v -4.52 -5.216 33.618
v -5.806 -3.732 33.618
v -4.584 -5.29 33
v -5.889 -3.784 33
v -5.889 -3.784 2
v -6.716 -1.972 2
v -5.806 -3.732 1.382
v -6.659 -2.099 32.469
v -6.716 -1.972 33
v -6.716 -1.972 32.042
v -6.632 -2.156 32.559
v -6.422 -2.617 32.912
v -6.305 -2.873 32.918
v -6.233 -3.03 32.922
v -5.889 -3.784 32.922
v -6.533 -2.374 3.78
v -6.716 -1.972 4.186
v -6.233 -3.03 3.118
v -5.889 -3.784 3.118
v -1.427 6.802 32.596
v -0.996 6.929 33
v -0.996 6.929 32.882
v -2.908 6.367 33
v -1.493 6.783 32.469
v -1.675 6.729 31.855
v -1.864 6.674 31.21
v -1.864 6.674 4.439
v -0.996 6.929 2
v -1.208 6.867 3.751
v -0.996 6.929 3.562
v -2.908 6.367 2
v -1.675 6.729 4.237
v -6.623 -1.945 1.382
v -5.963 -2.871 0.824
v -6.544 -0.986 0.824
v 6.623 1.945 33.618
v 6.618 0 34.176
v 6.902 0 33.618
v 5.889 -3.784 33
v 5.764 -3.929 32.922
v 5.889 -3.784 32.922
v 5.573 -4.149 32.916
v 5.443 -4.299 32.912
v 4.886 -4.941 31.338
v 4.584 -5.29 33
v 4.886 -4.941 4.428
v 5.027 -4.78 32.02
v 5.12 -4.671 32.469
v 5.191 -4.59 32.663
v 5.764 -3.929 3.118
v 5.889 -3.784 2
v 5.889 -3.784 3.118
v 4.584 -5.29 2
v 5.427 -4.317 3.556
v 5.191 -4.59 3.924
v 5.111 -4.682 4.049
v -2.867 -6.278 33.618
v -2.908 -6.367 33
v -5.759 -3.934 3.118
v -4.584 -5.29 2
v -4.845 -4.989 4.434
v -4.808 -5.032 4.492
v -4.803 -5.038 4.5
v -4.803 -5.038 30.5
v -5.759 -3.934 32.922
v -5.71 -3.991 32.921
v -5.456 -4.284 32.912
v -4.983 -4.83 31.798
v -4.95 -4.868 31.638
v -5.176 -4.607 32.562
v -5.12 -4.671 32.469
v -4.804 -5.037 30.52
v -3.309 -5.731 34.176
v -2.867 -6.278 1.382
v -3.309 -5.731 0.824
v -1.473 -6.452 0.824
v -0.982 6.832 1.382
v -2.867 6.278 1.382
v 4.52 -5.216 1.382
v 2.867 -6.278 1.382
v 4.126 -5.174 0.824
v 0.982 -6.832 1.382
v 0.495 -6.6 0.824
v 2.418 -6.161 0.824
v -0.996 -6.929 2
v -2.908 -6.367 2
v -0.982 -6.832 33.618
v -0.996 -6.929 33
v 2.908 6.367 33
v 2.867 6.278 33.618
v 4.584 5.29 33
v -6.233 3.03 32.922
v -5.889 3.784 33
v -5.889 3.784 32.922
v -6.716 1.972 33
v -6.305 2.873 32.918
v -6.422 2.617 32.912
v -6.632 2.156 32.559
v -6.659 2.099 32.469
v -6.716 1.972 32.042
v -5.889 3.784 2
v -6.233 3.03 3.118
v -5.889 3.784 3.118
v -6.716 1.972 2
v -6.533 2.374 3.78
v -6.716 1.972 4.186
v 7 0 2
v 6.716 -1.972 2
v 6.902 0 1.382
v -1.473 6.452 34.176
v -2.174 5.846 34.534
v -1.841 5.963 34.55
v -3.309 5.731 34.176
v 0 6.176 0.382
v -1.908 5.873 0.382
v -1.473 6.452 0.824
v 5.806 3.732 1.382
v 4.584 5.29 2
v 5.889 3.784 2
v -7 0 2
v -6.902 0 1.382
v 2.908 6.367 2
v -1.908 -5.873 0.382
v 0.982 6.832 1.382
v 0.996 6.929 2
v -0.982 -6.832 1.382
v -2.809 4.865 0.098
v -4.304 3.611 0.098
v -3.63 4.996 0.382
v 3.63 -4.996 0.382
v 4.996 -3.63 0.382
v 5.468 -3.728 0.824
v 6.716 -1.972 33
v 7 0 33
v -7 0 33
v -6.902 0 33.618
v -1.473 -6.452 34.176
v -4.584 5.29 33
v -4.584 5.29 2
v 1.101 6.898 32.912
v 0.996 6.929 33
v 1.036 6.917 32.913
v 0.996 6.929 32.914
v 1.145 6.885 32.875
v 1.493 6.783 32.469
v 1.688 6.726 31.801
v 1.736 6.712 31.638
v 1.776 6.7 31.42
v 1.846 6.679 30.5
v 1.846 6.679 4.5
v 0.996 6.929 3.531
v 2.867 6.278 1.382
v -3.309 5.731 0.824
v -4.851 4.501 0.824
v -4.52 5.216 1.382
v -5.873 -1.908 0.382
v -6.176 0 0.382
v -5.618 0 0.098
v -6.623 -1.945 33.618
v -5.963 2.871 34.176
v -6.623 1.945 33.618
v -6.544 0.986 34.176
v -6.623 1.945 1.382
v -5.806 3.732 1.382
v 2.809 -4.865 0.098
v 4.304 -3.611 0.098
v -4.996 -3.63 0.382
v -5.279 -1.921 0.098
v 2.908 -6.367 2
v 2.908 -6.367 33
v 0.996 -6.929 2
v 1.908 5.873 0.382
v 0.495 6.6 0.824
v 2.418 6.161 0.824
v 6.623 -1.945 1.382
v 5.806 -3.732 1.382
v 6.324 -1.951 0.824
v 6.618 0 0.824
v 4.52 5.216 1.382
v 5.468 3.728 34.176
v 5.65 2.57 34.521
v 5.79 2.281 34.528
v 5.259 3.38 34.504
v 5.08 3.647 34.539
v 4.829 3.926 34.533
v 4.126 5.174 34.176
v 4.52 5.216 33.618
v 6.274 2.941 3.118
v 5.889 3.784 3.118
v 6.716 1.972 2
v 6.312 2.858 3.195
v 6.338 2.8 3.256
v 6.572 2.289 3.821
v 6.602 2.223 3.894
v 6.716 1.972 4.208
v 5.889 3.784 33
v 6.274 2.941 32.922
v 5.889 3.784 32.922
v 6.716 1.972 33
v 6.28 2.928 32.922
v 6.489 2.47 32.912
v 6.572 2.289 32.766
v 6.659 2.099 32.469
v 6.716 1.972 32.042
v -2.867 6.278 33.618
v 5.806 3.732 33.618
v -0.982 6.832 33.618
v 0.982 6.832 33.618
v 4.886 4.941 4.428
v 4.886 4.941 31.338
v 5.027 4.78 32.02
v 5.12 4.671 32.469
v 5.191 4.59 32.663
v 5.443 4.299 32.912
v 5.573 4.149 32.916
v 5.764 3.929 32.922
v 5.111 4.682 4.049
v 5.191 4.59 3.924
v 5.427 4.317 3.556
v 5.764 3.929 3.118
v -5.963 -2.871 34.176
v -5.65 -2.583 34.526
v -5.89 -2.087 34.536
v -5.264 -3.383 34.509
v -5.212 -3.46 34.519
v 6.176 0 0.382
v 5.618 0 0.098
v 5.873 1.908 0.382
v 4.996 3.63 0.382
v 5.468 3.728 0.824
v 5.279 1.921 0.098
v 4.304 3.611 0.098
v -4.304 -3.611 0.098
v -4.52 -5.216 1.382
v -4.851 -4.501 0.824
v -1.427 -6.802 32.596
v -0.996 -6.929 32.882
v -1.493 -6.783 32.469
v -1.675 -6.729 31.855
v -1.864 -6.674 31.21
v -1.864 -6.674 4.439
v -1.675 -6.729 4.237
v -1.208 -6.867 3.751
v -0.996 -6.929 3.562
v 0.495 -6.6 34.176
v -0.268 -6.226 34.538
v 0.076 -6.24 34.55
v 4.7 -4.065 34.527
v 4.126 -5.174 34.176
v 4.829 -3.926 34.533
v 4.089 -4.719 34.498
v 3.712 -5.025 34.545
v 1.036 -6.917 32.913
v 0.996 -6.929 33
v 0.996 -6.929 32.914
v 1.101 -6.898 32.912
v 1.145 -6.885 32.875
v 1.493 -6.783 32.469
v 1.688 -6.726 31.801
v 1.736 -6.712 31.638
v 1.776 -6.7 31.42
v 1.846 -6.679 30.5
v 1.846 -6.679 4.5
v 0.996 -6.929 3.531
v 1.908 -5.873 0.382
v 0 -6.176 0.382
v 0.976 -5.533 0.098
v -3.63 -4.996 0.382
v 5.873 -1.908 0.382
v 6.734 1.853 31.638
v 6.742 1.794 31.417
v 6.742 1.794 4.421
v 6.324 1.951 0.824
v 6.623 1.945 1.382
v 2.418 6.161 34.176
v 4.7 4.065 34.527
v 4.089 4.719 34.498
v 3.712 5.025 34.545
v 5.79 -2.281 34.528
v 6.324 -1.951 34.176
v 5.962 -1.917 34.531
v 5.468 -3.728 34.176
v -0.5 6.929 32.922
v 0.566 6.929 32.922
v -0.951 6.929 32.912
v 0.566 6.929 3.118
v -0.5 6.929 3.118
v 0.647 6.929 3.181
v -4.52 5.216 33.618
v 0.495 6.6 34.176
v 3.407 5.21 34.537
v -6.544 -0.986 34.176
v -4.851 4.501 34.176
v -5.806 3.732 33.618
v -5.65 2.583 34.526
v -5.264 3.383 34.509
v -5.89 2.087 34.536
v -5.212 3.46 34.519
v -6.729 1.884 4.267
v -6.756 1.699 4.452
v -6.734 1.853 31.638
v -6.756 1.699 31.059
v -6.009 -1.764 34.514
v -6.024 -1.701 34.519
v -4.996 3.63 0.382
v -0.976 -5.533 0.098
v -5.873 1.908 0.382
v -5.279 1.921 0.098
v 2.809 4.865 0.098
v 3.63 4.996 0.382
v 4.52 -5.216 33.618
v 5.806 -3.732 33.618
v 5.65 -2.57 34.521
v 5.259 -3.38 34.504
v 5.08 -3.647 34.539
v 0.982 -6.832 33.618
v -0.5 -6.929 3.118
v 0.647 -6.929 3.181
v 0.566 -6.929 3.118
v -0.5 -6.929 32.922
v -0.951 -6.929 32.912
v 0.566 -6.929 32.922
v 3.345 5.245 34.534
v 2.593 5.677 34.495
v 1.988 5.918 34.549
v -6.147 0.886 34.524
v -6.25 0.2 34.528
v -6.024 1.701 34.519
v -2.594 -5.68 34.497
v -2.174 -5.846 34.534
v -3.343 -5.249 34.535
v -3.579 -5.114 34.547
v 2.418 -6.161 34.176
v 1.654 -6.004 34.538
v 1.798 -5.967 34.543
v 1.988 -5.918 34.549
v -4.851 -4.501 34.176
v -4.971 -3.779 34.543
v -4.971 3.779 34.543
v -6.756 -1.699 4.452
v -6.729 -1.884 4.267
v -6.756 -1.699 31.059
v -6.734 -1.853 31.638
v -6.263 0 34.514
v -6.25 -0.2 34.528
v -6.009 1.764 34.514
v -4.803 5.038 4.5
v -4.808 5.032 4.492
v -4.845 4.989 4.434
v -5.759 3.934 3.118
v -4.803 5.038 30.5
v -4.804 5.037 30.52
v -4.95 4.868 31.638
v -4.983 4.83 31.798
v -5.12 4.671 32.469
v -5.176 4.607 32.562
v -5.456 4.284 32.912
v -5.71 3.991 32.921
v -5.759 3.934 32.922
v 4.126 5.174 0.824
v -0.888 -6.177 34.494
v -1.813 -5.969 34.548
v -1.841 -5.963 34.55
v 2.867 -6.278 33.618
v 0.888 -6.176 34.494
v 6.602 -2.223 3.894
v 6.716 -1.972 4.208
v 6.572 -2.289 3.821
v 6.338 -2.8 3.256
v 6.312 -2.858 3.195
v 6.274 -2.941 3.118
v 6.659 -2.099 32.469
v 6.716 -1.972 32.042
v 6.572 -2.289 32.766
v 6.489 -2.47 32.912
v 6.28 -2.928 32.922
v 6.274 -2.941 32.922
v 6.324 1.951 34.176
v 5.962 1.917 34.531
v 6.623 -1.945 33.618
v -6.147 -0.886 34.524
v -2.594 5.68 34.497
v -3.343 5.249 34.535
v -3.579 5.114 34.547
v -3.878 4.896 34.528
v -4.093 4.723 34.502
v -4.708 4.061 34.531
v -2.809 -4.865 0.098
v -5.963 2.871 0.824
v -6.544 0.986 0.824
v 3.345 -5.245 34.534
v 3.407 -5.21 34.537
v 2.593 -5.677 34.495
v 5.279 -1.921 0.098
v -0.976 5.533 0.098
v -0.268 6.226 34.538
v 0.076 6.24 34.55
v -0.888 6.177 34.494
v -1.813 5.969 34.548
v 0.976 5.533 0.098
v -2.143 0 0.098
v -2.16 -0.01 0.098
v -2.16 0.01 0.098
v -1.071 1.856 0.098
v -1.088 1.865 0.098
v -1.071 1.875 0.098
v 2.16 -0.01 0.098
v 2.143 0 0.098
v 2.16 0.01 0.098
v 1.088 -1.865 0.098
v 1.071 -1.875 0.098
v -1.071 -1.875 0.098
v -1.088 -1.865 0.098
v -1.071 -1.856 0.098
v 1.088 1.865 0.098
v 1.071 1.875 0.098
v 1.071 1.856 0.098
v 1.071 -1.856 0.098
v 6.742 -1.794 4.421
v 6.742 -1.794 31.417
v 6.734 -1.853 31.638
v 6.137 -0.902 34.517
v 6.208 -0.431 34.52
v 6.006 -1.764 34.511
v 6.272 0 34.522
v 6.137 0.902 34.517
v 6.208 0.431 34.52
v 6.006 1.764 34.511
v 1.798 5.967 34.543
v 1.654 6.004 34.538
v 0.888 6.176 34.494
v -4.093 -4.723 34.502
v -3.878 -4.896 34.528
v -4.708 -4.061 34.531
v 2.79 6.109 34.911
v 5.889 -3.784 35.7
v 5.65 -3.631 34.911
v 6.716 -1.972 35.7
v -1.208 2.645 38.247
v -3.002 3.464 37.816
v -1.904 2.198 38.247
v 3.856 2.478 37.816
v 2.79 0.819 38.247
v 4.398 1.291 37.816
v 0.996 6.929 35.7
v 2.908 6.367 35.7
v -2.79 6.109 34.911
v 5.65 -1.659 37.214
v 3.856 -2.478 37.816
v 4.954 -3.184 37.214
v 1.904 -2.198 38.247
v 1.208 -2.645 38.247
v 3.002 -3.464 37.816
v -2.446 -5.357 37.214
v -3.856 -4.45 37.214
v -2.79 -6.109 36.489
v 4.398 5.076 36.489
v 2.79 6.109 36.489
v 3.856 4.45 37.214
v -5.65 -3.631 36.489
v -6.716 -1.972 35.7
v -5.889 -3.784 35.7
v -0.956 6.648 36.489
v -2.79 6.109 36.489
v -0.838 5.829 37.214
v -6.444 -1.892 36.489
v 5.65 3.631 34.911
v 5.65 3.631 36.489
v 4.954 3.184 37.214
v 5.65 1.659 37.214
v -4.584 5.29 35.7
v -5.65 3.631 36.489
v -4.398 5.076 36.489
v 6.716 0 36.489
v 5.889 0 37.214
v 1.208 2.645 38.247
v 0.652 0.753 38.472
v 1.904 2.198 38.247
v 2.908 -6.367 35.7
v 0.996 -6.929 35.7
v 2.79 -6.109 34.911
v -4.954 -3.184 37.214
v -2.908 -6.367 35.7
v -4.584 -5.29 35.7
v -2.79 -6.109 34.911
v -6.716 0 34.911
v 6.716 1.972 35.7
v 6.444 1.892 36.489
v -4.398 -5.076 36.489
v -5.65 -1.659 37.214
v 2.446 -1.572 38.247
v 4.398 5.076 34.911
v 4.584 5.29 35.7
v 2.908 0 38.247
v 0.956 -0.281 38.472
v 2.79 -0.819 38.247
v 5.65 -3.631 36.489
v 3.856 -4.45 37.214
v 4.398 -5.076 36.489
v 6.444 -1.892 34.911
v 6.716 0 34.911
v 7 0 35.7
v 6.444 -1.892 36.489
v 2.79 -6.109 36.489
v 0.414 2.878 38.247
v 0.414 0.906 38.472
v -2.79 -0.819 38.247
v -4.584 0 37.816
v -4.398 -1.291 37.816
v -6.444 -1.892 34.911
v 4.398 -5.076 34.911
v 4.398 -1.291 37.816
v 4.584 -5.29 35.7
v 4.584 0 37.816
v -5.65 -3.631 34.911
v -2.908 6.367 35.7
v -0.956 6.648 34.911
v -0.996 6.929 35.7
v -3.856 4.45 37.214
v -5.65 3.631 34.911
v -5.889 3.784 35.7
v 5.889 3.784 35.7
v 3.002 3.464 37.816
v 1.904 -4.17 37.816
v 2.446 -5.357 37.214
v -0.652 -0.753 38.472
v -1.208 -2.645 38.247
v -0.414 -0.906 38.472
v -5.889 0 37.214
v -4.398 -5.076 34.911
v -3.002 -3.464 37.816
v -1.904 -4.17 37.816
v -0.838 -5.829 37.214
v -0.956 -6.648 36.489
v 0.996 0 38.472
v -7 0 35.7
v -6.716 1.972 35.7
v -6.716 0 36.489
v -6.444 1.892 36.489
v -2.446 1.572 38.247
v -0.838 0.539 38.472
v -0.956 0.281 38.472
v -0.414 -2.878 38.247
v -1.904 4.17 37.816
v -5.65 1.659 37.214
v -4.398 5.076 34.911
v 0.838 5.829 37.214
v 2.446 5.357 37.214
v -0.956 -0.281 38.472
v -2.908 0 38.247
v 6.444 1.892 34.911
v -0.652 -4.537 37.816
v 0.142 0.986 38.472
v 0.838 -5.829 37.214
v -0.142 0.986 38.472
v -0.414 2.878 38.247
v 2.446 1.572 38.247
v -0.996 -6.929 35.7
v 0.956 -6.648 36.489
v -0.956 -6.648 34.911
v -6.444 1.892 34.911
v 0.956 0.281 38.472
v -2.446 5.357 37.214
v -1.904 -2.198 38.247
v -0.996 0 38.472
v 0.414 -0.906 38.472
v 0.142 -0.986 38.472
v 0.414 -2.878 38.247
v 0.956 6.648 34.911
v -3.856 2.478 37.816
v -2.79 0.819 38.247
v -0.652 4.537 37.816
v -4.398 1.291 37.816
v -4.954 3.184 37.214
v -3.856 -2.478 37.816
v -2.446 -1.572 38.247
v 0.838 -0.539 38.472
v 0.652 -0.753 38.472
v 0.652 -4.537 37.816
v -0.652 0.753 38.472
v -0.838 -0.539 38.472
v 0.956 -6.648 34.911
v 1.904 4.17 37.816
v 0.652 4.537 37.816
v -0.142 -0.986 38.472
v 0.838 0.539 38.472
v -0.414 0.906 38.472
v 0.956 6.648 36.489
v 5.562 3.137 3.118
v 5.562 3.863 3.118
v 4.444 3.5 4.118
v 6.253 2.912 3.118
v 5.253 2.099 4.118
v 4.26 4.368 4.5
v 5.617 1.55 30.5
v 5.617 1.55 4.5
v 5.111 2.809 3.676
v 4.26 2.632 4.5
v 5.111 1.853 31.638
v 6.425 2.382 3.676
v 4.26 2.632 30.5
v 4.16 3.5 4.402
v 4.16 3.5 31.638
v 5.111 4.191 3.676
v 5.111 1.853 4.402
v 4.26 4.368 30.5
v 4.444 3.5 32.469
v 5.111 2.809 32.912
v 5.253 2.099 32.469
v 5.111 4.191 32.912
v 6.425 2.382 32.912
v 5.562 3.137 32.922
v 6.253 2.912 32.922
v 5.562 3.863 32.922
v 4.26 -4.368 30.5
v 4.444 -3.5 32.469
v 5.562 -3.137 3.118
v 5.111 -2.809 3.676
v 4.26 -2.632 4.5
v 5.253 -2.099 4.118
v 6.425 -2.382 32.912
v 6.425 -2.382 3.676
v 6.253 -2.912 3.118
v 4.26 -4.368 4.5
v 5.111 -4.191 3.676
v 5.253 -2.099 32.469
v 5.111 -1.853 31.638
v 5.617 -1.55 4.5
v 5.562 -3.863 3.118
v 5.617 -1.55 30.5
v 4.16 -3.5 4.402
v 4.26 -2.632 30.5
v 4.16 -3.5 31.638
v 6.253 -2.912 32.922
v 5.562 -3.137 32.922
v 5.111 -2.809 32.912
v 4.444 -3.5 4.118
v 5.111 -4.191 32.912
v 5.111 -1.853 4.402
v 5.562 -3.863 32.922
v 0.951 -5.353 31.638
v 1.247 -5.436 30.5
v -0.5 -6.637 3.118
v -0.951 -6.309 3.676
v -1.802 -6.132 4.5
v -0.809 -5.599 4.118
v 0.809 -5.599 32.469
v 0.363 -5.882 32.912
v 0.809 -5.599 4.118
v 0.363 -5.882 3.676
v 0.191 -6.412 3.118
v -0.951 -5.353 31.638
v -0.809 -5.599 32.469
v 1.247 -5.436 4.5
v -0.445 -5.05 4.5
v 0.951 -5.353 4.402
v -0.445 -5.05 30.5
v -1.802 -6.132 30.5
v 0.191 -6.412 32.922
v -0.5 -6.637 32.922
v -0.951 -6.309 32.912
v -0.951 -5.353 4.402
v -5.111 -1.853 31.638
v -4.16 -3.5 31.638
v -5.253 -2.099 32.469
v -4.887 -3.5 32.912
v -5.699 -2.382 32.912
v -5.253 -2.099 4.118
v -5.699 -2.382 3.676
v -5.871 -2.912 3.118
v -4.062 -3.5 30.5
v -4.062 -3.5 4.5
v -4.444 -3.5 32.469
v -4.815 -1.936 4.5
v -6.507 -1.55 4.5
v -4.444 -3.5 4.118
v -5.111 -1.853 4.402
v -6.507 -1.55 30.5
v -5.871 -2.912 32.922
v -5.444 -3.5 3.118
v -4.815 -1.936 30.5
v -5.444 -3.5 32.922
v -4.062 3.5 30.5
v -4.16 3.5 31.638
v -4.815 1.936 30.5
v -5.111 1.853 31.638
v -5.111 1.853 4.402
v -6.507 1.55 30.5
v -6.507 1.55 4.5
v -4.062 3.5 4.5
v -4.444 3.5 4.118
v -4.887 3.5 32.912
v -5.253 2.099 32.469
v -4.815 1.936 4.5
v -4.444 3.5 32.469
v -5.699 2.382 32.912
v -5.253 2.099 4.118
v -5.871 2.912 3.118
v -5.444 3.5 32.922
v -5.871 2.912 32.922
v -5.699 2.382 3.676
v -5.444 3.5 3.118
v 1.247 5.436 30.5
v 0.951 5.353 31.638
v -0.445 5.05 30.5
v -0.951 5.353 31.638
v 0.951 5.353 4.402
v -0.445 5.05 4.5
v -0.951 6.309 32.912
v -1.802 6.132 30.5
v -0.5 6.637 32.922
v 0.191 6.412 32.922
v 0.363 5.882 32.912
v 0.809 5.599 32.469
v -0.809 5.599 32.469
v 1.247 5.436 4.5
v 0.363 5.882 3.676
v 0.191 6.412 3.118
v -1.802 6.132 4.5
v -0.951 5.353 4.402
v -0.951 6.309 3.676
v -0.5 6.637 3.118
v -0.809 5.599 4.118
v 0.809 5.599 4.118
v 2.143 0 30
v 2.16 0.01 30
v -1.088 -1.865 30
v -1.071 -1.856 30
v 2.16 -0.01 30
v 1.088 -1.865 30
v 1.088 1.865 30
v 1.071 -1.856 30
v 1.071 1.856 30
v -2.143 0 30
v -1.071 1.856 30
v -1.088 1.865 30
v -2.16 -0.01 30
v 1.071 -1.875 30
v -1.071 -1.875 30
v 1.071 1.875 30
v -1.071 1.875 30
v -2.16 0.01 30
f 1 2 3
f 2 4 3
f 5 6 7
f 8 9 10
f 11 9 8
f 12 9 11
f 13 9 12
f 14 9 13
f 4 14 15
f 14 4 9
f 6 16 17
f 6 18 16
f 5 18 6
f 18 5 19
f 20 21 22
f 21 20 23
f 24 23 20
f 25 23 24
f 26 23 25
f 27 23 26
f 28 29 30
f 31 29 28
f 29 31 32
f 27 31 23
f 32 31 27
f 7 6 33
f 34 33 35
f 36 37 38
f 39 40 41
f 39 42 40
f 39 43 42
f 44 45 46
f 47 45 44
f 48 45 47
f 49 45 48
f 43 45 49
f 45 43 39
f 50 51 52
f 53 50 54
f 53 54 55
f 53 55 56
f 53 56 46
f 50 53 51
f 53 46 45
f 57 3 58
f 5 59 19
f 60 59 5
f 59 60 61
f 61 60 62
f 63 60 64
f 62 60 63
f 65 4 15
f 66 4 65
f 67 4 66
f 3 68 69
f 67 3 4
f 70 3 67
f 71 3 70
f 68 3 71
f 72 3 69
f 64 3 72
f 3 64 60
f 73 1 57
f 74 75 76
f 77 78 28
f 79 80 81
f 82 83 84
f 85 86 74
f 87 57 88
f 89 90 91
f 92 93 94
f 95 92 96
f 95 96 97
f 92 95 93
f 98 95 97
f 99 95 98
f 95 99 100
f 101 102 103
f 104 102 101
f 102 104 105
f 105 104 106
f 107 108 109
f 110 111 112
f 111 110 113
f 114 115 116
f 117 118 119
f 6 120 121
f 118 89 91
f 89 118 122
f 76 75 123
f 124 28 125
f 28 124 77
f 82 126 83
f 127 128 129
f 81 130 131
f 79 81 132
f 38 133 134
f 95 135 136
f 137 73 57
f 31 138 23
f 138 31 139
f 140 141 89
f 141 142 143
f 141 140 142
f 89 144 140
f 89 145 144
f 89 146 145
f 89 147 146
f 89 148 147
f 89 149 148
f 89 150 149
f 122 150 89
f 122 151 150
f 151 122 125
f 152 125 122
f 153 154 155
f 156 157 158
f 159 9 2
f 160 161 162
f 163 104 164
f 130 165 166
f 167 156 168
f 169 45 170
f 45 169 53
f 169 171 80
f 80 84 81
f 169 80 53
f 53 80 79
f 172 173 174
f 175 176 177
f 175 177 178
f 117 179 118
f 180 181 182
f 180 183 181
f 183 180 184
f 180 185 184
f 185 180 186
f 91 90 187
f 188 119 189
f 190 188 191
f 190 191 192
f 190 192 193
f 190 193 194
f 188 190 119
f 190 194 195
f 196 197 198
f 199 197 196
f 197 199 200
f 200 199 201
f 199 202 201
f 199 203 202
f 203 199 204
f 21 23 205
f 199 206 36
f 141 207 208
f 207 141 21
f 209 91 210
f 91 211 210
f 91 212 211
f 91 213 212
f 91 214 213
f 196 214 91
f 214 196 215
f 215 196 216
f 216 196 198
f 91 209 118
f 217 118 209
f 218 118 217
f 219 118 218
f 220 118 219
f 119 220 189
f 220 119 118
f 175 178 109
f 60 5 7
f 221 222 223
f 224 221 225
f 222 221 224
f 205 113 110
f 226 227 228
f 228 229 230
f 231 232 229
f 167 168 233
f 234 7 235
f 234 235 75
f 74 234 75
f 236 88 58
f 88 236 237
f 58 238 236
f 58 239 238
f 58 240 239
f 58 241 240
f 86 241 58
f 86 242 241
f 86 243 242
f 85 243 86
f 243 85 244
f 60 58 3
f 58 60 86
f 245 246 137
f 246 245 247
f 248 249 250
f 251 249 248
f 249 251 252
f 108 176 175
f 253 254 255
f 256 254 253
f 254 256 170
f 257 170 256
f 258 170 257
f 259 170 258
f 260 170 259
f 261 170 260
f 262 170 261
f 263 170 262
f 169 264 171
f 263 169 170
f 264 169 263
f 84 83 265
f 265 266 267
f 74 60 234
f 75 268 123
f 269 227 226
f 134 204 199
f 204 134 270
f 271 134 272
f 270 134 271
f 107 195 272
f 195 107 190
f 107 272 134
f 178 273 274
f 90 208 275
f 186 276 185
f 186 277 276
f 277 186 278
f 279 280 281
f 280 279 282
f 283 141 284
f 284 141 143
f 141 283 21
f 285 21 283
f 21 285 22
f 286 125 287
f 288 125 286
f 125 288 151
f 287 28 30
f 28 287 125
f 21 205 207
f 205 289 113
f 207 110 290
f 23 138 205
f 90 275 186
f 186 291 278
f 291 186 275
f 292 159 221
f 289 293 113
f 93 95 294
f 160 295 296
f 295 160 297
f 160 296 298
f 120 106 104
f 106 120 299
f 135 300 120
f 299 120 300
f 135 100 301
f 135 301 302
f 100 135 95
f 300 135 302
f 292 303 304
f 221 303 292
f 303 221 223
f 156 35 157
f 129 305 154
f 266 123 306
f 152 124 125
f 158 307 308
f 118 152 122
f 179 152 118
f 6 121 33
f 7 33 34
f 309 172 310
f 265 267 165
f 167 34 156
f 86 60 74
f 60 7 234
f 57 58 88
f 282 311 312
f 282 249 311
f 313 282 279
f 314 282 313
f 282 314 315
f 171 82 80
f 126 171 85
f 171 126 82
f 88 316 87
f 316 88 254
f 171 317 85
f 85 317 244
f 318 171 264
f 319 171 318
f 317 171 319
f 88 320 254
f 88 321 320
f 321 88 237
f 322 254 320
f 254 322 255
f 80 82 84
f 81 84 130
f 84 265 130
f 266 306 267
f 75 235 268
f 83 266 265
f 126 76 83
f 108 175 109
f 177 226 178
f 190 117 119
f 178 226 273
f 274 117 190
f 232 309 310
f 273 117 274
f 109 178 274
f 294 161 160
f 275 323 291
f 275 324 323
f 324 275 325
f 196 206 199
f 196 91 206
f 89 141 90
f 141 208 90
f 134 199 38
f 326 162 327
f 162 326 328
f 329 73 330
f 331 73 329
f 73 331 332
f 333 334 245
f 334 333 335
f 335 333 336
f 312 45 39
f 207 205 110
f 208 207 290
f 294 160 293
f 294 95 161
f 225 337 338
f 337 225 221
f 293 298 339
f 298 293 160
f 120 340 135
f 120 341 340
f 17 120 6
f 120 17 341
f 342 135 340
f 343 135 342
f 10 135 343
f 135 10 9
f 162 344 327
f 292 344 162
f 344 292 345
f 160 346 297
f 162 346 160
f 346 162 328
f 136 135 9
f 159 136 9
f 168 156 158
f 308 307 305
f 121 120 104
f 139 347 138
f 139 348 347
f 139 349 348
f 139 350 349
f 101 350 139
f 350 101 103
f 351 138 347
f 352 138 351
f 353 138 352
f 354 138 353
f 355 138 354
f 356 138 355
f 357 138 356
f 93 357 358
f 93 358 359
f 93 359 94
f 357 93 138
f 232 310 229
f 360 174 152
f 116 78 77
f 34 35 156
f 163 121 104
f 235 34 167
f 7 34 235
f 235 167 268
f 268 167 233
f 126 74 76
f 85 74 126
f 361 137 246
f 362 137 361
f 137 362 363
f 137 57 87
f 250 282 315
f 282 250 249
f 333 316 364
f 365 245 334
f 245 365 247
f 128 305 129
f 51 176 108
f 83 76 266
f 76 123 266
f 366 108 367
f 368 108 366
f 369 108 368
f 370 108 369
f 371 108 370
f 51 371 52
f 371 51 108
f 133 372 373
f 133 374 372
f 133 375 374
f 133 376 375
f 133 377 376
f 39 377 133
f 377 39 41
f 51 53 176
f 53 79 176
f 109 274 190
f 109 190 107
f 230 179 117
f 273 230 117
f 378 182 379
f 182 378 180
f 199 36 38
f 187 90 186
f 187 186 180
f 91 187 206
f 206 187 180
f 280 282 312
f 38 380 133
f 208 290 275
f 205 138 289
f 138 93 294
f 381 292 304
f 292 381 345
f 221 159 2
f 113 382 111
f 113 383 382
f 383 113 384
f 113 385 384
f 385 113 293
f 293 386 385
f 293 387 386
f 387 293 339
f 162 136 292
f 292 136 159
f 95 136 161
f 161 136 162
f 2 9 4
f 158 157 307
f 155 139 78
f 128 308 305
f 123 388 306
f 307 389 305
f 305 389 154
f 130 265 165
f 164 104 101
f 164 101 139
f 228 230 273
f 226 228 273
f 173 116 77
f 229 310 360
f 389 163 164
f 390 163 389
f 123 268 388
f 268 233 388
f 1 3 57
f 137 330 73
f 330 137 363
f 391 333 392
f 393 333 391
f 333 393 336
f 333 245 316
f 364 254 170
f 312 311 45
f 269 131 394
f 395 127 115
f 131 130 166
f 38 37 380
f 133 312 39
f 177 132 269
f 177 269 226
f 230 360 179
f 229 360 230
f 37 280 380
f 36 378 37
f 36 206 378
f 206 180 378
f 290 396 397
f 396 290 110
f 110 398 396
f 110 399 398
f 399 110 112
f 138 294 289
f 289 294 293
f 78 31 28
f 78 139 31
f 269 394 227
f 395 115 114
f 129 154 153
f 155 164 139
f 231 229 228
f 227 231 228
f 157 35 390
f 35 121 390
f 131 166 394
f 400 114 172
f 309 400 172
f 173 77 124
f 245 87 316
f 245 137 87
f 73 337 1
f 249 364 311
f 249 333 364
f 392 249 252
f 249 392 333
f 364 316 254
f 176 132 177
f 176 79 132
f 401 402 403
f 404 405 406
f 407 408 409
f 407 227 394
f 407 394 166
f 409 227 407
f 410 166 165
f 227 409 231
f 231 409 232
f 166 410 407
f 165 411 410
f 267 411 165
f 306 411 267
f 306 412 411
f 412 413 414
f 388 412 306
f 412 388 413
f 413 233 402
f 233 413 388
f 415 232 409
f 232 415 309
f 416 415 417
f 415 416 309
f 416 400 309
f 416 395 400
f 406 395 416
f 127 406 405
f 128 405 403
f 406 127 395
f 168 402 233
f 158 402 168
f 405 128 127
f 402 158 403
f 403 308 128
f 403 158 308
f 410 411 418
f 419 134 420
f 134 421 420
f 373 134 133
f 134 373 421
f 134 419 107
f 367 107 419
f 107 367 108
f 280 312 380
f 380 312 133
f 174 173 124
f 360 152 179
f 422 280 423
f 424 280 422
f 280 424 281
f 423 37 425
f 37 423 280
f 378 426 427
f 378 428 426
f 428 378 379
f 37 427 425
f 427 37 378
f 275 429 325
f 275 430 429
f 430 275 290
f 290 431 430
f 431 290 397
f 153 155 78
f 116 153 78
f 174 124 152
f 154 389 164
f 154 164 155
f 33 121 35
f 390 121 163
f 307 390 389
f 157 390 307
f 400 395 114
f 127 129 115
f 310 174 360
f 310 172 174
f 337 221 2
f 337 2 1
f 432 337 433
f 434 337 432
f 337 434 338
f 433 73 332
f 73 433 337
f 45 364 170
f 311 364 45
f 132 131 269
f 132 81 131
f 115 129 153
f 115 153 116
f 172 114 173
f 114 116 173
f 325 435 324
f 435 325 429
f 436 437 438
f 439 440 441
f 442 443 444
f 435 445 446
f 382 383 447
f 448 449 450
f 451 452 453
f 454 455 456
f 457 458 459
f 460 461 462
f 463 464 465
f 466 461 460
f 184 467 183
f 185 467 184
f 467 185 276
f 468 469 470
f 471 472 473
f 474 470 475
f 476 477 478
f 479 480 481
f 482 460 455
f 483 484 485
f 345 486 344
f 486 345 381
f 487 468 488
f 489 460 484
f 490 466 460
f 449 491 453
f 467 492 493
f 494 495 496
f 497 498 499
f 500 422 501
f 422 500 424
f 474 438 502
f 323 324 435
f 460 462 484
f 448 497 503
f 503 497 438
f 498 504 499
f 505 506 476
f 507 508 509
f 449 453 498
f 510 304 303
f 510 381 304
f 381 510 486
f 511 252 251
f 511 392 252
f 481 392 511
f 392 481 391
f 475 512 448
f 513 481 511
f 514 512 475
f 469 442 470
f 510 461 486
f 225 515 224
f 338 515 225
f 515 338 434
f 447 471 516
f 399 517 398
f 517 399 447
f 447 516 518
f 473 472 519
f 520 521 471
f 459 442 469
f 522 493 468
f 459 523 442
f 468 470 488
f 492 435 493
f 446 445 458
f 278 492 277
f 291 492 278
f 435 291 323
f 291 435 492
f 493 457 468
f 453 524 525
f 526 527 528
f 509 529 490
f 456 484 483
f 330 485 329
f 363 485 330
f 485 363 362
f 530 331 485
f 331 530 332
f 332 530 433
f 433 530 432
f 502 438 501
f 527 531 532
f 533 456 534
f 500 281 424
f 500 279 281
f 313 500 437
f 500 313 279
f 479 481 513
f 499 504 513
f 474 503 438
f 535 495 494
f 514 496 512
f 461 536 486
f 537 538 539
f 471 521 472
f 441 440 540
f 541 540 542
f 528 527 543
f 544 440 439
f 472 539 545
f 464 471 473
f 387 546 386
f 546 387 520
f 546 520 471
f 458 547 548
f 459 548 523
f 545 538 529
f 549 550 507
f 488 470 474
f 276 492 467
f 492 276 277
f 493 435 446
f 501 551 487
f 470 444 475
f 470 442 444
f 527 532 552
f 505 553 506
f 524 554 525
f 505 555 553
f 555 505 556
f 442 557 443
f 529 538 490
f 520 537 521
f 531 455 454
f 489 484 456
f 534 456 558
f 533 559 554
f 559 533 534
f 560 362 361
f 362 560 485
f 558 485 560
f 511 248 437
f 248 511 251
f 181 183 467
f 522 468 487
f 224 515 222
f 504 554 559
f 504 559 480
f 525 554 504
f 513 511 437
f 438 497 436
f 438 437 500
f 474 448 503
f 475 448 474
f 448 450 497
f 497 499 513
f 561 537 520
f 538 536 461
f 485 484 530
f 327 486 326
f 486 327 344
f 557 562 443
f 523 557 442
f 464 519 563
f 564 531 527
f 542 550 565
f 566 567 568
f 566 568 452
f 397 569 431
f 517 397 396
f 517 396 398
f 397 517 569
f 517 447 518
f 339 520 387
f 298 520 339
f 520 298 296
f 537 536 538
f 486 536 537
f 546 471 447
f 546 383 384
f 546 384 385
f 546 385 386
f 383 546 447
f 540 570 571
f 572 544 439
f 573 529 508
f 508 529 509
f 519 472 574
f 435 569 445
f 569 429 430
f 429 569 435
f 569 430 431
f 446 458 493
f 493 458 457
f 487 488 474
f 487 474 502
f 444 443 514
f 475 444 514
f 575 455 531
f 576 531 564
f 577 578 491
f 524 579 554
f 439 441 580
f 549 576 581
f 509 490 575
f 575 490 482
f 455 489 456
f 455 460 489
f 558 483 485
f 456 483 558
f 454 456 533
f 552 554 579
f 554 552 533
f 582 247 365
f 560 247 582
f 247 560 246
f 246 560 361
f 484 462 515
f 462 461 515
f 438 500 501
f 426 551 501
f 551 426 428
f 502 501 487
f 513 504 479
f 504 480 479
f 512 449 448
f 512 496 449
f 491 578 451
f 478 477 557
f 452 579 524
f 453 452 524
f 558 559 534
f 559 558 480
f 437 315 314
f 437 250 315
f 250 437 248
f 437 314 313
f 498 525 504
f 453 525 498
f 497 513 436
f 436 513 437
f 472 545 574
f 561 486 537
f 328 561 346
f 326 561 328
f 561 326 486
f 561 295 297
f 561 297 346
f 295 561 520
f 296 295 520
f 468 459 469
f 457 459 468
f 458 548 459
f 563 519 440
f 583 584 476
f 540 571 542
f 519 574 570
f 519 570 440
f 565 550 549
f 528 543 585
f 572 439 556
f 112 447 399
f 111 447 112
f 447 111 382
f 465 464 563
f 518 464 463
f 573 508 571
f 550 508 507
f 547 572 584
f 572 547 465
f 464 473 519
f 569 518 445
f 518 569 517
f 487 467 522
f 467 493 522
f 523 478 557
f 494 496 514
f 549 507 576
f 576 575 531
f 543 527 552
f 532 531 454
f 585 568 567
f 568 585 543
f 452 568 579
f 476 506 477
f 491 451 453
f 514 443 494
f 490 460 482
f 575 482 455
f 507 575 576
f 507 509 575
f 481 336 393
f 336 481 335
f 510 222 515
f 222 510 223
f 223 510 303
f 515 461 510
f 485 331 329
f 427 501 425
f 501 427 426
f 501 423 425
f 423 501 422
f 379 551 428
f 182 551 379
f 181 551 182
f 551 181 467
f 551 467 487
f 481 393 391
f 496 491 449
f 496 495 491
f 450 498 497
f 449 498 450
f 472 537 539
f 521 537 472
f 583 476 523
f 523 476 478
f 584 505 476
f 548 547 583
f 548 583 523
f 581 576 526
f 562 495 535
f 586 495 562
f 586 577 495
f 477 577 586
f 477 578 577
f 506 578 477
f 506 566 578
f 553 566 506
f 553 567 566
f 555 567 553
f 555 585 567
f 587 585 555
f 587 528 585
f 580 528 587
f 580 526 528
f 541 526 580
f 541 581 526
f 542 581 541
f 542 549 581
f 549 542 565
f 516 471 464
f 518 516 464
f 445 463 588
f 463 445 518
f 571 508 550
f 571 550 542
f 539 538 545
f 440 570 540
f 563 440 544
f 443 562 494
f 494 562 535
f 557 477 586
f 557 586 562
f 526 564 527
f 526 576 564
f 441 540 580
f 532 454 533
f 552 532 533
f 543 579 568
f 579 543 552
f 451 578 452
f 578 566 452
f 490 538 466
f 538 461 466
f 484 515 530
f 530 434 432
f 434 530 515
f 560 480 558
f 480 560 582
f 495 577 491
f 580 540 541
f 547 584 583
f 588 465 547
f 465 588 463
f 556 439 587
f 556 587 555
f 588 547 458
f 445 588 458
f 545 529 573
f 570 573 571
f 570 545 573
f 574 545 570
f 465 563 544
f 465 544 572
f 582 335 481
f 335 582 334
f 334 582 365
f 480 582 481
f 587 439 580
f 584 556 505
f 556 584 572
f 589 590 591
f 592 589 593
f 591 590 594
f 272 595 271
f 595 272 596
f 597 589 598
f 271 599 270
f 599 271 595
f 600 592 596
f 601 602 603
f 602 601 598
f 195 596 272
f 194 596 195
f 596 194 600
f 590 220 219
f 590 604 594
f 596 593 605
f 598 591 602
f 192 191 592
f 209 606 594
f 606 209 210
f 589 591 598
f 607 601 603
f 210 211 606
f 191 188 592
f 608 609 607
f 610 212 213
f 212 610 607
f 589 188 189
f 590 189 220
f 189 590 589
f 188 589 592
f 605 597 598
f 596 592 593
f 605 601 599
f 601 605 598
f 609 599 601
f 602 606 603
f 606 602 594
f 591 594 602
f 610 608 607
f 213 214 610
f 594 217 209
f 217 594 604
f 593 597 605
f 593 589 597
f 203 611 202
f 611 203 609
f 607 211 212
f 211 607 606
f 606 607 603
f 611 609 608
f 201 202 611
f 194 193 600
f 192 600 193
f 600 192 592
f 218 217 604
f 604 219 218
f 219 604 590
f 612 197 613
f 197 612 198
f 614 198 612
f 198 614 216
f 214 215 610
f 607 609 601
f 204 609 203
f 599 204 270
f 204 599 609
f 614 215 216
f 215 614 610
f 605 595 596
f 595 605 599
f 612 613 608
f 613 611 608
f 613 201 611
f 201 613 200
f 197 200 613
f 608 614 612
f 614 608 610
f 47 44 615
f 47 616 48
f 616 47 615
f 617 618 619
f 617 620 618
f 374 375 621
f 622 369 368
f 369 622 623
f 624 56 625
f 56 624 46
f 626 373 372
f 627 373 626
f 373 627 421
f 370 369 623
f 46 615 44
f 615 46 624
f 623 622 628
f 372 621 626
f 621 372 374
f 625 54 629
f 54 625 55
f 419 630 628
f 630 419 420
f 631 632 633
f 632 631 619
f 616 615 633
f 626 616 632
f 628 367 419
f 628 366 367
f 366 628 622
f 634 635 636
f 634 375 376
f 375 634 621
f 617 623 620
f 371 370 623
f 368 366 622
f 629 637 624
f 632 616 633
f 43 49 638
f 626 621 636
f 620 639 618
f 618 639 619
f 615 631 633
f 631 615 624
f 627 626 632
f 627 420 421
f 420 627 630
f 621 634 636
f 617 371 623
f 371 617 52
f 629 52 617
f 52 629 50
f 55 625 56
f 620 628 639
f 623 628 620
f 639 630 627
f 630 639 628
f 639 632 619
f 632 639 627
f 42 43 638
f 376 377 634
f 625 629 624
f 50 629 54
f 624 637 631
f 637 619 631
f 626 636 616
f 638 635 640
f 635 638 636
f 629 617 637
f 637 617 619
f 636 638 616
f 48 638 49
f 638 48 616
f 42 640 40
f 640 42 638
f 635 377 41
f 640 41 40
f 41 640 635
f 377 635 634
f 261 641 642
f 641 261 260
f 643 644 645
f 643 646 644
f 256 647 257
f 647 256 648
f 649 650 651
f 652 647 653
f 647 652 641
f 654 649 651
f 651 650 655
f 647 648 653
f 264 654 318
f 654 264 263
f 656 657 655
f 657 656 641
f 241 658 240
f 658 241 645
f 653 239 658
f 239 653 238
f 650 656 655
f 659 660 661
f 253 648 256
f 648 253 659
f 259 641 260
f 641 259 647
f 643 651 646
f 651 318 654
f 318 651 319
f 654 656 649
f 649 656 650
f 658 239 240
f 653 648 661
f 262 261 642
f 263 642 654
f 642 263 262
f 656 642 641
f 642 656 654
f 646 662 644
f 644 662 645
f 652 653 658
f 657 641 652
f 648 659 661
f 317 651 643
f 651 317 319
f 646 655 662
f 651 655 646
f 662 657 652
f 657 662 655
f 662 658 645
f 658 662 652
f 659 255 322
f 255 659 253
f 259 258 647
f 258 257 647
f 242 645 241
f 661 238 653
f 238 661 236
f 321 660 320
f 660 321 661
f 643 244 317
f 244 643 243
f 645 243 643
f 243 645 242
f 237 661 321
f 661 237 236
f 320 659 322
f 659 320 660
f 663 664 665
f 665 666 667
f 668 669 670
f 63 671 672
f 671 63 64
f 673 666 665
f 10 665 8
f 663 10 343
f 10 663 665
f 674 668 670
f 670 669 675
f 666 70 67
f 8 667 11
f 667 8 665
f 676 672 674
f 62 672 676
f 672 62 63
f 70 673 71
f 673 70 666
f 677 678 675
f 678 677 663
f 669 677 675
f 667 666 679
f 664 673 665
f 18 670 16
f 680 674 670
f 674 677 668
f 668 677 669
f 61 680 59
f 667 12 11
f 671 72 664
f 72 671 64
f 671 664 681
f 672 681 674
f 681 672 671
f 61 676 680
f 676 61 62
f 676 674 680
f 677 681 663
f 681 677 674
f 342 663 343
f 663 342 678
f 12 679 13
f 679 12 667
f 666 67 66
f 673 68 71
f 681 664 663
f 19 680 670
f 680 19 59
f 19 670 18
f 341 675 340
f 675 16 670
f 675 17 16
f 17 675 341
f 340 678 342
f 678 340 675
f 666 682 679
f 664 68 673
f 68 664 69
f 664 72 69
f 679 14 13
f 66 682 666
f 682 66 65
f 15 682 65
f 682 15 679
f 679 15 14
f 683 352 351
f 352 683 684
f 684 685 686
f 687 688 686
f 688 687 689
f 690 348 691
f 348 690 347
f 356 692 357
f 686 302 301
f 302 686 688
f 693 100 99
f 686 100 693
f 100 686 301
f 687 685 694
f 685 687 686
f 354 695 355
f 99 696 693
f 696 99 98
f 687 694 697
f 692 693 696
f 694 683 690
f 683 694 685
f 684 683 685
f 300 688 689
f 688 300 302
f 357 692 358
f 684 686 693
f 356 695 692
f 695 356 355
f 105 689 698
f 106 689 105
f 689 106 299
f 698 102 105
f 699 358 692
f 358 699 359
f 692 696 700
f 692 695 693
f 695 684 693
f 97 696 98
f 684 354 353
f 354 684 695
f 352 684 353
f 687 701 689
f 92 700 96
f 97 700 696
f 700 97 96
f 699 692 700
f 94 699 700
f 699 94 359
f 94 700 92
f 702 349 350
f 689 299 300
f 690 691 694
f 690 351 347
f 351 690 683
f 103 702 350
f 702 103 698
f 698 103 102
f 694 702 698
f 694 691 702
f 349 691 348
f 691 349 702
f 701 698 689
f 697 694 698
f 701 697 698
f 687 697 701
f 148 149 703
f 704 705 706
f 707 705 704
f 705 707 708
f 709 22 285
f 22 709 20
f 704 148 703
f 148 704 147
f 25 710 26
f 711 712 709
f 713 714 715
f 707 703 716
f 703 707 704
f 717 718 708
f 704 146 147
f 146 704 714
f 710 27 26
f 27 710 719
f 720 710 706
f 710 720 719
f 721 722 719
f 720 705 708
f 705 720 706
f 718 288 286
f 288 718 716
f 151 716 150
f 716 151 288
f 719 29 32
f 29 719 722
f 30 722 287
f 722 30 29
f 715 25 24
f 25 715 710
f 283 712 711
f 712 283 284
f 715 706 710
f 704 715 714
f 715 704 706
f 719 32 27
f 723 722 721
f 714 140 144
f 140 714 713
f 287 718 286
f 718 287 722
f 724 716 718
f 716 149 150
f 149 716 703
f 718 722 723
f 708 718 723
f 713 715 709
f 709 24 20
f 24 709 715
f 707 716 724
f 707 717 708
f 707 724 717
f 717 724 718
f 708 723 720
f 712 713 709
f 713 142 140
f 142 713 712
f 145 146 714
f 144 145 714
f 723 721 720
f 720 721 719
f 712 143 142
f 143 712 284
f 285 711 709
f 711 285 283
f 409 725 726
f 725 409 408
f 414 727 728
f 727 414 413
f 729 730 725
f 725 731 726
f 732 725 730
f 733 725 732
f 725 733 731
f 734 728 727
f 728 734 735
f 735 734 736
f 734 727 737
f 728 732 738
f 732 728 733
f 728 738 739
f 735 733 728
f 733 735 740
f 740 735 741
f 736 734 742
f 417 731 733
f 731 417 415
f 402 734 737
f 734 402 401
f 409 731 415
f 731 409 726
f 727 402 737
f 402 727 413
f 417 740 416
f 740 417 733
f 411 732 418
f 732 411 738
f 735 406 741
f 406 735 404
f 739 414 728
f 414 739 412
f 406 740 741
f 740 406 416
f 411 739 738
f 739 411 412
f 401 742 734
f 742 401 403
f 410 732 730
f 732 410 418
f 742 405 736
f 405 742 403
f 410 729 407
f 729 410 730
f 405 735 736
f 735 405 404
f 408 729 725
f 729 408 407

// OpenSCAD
bitSize=7.5; // this is the maximum diameter of the bit in mm
bitLength=30;//defines the amount the bit will be embedded in the driver
driverRadius=7; //radius of the driver
driverHeight=35; //height of the driver (currently is the height of the body, i am too lazy to fix it to be the overall height of the driver... sorry
numOfGrips=6;// number of cut outs for your fingers to grab
gripRadius=2;// defines the radius of the figer holds
gripHeight=30;//defines the length of the finger holds
bevelRadius=2;// this defines the curve at the bottom
SmoothingAmount=5;// this is the smoothing factor on the rounded caps 

module driverBase(){
	hull(){
		for(i=[1:SmoothingAmount])
		{
  			translate([0,0,+bevelRadius-bevelRadius*cos(i*90/SmoothingAmount)])cylinder(r=(driverRadius-bevelRadius+bevelRadius*sin(i*90/SmoothingAmount)),h=(driverHeight-2*bevelRadius+2*bevelRadius*cos(i*90/SmoothingAmount)));
		}
	}
}

module grips(){
	for(i=[1:numOfGrips])
	{
	hull(){
		for(n=[1:SmoothingAmount])
			translate([driverRadius*sin(i*360/numOfGrips),driverRadius*cos(i*360/numOfGrips),(driverHeight-gripHeight)/2+gripRadius*sin(n*90/SmoothingAmount)]) cylinder(r=gripRadius*sin(n*90/SmoothingAmount),h=gripHeight-2*gripRadius+2*gripRadius*cos(n*90/SmoothingAmount));
		}
	}
}
module hexagon(size, height) {
  boxWidth = size/1.75;
  for (r = [-60, 0, 60]) rotate([0,0,r]) cube([boxWidth, size, height], true);
}
module head(){
translate([0,0,driverHeight+.1*driverRadius]) scale([1,1,.4]) sphere(driverRadius);
}
difference(){
union(){
driverBase();
head();
}
grips();
translate(0,0,bitLength)hexagon(bitSize/2,bitLength*2);
}
